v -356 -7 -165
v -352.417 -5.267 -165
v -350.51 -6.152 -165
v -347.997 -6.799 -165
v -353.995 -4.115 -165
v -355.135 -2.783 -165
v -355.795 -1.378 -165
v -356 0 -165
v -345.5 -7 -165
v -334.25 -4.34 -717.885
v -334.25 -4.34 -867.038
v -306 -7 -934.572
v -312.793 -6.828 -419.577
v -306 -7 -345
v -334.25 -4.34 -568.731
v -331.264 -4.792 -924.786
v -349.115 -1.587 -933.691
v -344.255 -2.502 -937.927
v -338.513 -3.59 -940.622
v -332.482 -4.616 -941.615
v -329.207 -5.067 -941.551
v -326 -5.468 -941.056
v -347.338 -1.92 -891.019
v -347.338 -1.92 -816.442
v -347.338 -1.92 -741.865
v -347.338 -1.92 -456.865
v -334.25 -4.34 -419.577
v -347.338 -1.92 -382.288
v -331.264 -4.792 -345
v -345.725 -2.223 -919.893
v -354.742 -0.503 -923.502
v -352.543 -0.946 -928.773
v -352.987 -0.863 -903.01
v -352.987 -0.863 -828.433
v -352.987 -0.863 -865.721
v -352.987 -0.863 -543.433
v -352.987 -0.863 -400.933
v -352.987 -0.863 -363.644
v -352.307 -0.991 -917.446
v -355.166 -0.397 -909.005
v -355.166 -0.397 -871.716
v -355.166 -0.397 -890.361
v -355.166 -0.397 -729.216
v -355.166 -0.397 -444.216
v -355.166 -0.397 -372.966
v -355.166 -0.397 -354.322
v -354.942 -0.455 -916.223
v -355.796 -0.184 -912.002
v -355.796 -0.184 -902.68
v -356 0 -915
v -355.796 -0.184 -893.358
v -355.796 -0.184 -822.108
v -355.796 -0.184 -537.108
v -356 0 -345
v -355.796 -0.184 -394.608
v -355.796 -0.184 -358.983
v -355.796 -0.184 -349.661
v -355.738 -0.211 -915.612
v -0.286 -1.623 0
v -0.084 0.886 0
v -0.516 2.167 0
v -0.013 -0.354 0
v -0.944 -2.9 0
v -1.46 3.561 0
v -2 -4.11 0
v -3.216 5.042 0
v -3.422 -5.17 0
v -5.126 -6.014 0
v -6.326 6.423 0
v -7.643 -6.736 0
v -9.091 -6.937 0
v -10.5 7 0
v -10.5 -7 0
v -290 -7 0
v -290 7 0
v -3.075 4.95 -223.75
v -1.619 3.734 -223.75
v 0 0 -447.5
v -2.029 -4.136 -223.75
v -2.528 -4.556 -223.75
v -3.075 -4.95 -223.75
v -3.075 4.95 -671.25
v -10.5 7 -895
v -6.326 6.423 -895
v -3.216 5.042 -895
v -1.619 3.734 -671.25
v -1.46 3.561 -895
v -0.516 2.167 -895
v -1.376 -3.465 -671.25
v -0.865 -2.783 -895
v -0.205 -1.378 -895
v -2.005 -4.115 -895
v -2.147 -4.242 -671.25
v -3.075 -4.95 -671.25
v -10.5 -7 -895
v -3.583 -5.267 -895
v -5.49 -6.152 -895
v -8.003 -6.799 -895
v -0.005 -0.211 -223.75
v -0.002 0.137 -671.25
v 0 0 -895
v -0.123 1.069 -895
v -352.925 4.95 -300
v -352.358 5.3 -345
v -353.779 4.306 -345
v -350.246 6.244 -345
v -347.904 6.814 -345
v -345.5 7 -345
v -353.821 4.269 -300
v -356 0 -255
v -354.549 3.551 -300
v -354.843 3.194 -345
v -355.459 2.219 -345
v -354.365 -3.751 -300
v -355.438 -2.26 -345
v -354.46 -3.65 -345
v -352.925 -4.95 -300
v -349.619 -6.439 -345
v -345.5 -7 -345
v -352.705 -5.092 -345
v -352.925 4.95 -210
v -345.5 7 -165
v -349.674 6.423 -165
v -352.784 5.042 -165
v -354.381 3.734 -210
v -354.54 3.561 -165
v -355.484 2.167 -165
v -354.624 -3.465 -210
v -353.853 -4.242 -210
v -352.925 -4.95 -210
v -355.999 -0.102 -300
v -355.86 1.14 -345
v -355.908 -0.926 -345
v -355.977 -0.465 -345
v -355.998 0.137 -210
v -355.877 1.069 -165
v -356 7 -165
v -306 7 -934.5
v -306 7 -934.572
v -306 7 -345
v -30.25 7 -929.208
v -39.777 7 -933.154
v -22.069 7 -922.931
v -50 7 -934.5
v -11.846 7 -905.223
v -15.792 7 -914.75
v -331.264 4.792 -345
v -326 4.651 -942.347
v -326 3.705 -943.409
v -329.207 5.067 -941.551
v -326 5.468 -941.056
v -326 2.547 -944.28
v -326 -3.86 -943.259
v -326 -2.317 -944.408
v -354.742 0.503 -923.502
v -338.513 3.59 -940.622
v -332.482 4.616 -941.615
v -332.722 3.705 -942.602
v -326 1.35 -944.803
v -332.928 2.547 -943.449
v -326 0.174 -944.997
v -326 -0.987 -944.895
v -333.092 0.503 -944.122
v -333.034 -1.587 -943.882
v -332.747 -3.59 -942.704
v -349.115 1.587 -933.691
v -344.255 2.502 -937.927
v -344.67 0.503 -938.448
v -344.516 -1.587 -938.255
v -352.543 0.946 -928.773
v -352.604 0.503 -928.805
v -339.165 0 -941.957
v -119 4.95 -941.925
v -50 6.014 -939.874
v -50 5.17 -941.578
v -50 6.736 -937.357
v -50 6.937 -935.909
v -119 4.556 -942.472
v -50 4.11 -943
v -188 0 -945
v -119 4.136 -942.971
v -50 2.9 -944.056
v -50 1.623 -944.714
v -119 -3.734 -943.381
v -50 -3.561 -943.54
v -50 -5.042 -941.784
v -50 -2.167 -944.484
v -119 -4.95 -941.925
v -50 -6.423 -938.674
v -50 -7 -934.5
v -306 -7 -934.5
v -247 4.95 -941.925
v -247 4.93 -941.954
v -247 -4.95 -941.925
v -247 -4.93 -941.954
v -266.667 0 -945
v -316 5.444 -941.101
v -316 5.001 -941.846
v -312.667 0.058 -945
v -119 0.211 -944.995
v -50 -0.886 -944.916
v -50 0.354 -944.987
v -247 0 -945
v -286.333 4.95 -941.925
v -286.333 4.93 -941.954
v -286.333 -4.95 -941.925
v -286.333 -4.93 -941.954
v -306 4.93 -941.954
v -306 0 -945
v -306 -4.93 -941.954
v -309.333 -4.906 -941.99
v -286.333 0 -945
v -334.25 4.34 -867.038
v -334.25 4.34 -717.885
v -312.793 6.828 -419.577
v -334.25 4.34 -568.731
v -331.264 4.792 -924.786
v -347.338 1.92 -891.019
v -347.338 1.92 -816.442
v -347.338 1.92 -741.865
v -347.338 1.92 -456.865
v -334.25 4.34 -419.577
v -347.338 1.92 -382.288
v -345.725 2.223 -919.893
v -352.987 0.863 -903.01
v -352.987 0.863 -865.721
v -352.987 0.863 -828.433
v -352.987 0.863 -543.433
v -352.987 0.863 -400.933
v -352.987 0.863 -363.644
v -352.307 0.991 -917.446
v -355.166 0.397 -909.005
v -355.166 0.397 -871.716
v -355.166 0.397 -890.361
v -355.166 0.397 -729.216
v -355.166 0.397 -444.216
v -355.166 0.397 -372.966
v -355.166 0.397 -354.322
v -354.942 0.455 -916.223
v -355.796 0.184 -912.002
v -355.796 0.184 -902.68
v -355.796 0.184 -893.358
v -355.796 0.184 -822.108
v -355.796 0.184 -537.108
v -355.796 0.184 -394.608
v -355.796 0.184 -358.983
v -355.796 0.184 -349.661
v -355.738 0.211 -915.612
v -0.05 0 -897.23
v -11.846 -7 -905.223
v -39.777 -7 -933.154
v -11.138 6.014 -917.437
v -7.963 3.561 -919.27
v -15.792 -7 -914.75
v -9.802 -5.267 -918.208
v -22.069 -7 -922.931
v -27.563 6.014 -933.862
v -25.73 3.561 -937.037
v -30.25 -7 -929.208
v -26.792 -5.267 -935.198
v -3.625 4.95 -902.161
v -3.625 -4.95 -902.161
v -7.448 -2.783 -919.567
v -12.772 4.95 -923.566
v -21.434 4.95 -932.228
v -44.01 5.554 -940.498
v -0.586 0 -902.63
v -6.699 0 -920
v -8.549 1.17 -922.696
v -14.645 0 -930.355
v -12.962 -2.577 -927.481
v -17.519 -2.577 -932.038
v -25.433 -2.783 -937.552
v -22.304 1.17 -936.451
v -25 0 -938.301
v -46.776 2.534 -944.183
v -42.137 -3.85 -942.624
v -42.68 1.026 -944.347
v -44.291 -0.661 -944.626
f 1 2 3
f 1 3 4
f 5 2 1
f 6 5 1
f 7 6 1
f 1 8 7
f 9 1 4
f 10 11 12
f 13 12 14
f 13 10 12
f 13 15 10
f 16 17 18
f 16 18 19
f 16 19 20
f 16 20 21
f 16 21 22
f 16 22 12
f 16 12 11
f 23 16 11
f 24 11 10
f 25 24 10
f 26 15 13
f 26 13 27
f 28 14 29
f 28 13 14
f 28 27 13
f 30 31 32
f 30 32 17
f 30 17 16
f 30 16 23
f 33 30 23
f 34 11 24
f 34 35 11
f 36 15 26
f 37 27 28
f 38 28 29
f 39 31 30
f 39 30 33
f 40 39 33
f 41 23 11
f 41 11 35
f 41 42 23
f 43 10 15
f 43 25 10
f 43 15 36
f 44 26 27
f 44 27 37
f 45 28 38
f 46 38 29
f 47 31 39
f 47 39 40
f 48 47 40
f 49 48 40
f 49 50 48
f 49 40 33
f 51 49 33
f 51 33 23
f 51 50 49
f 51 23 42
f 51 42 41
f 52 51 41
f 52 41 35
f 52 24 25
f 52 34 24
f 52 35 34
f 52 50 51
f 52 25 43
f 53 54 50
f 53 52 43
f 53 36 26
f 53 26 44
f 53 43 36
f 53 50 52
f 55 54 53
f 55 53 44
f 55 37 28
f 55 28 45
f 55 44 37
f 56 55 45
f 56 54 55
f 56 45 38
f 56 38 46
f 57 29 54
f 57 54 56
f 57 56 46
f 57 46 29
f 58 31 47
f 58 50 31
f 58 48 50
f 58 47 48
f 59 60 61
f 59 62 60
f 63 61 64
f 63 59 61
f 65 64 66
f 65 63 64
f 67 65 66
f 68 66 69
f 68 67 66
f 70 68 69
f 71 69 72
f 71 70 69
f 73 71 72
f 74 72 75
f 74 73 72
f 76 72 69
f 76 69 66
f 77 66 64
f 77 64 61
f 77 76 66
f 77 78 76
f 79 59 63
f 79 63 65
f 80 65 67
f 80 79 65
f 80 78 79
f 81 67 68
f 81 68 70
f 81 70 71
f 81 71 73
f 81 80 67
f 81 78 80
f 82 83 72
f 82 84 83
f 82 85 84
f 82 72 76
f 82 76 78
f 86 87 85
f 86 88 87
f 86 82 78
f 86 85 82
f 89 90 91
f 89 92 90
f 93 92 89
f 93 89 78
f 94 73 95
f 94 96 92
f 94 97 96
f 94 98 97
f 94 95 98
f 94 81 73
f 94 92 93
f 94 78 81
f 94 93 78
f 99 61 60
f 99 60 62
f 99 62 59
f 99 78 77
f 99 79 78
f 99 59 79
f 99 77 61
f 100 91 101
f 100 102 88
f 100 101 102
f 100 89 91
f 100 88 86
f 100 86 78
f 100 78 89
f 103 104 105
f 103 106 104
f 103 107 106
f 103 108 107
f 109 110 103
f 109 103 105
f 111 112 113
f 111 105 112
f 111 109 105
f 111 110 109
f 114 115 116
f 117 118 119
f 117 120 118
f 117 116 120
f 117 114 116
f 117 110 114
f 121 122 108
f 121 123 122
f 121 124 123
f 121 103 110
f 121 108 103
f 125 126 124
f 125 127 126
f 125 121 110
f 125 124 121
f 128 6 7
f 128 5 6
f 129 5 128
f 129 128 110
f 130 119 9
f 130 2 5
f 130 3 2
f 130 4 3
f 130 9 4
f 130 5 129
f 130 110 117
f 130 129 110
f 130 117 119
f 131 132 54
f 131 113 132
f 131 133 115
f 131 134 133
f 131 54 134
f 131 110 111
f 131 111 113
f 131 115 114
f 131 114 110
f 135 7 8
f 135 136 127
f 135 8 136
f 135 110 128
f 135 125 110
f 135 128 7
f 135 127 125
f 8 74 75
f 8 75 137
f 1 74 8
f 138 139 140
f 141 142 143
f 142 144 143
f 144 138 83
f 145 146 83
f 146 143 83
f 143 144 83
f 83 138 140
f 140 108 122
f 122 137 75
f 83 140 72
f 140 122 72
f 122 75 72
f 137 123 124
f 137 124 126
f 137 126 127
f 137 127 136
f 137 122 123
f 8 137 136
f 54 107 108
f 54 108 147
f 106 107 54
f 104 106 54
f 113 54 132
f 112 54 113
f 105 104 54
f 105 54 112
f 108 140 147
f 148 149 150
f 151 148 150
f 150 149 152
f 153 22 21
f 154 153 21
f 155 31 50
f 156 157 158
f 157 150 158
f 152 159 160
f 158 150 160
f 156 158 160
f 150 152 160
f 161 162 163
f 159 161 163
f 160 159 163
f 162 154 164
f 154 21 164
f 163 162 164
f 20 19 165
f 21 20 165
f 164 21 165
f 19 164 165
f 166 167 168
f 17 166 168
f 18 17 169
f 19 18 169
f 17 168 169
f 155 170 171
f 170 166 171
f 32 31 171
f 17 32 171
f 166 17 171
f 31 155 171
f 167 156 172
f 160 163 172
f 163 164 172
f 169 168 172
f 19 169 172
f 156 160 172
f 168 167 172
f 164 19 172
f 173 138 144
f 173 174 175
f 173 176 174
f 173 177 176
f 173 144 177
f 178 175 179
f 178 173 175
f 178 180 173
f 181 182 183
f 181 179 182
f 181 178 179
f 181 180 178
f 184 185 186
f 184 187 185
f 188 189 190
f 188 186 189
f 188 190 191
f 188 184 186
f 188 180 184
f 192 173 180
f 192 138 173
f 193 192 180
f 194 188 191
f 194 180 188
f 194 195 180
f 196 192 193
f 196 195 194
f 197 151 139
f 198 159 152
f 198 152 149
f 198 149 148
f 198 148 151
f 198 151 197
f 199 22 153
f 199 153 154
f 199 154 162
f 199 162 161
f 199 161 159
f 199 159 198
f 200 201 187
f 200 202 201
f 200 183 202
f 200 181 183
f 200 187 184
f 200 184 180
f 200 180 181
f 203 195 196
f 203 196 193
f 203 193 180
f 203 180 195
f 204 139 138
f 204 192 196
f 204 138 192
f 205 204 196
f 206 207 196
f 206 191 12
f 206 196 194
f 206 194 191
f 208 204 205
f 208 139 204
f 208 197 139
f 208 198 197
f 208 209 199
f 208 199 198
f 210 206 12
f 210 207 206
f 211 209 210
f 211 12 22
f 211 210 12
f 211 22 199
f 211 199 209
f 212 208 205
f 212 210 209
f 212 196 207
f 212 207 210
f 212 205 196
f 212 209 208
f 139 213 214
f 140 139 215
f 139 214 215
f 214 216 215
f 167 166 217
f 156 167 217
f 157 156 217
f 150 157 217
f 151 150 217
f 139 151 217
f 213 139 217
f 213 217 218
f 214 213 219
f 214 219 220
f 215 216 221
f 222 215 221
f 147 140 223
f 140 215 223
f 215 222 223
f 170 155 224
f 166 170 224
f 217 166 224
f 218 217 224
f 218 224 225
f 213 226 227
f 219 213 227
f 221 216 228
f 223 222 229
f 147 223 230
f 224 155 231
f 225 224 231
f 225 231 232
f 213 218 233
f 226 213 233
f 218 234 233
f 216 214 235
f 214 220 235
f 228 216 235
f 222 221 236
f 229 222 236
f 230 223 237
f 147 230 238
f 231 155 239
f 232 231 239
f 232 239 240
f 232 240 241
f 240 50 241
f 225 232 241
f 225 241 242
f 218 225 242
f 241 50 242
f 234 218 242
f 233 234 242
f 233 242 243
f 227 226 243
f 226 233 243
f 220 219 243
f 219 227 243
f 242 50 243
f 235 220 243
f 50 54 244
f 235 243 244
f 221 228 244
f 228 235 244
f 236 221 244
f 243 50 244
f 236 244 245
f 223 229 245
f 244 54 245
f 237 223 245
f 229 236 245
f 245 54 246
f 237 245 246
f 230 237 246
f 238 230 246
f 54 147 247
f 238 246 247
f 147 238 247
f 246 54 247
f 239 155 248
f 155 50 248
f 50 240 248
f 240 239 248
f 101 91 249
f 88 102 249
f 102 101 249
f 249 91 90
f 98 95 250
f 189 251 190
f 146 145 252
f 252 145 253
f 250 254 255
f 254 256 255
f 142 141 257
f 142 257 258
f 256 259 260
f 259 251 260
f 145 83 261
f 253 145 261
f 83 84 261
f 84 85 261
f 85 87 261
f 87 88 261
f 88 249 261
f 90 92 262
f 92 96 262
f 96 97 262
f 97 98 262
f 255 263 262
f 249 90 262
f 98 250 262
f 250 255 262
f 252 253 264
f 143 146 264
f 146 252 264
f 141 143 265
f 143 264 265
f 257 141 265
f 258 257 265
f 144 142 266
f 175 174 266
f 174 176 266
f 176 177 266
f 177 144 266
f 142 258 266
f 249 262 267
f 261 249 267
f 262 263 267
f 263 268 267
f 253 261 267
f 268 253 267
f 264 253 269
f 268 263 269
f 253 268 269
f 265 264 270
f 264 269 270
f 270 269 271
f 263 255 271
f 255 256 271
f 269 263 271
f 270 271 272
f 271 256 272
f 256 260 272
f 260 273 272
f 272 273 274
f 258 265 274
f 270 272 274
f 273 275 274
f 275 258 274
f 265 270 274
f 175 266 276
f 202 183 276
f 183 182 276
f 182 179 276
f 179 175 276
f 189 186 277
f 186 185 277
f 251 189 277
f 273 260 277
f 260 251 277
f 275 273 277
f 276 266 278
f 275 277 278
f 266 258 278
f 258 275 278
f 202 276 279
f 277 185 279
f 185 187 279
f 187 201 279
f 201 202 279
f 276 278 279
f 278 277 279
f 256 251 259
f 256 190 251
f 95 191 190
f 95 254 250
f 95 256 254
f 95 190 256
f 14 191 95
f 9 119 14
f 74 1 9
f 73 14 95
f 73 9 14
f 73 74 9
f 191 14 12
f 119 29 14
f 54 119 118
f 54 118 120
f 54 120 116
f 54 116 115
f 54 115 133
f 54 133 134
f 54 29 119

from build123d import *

# Parameters (mm, degrees)
F2_DEPTH = 7
F8_DEPTH = 975


with BuildPart() as f2:
    # F1 (on Front) → F2 (new body, symmetric)
    with BuildSketch(Plane.XZ):
        with BuildLine():
            Line((0, -895), (0, 0))
            Line((0, 0), (-290, 0))
            Line((-290, 0), (-356, -165))
            Line((-356, -165), (-356, -915))
            ThreePointArc((-356, -915), (-347.2132034356, -936.2132034356), (-326, -945))
            Line((-326, -945), (-50, -945))
            ThreePointArc((-50, -945), (-14.6446609407, -930.3553390593), (0, -895))
        make_face()
    extrude(amount=F2_DEPTH, both=True)

    # F7: sweep along a path in F6
    with BuildLine(Plane.XZ) as f7_path:
        Line((0, 0), (0, -895))
        ThreePointArc((0, -895), (-14.6446609407, -930.3553390593), (-50, -945))
        Line((-50, -945), (-326, -945))
        ThreePointArc((-326, -945), (-347.2132034356, -936.2132034356), (-356, -915))
        Line((-356, -915), (-356, -165))
    # F3 (on Top) → F7 (sweep, cut)
    with BuildSketch(Plane.XY):
        with BuildLine():
            add(Edge.make_bspline(
                [(-10.5, -7), (0, -7), (0, 0), (0, 7), (-10.5, 7)],
                knots=[1.5707963268, 1.5707963268, 1.5707963268, 3.1415926536, 3.1415926536, 4.7123889804, 4.7123889804, 4.7123889804], degree=2, weights=[1, 0.7071067812, 1, 0.7071067812, 1]))
            Line((-10.5, -7), (-10.5, -10.9903514385))
            Line((-10.5, -10.9903514385), (2.9582334682, -10.9903514385))
            Line((2.9582334682, -10.9903514385), (2.9582334682, 9.6543207765))
            Line((2.9582334682, 9.6543207765), (-10.5, 9.6543207765))
            Line((-10.5, 9.6543207765), (-10.5, 7))
        make_face()
    sweep(path=f7_path.line, mode=Mode.SUBTRACT)

    # F5 (on offset) → F8 (cut)
    with BuildSketch(Plane.XY.offset(-345)):
        with BuildLine():
            add(Edge.make_bspline(
                [(-356, 0), (-355.9996167193, -0.0454979949), (-355.7262318617, -0.3490169016), (-351.6143061608, -1.1228221561), (-344.1757011611, -2.5027621783), (-334.2818527153, -4.4295739273), (-327.4112328055, -5.2982865334), (-320.106609709, -6.1901737902), (-312.7811010491, -6.9295265019), (-308.3315673438, -6.9911803665), (-306, -6.999836)],
                knots=[0, 0, 0, 0, 0.0262702759, 0.1267393838, 0.2761689471, 0.4425533677, 0.5809422546, 0.7218358167, 0.8636471523, 1, 1, 1, 1], degree=3))
            add(Edge.make_bspline(
                [(-356, 0), (-355.9996167193, 0.0454979949), (-355.7262318617, 0.3490169016), (-351.6143061608, 1.1228221561), (-344.1757011611, 2.5027621783), (-334.2818527153, 4.4295739273), (-327.4112328055, 5.2982865334), (-320.106609709, 6.1901737902), (-312.7811010491, 6.9295265019), (-308.3315673438, 6.9911803665), (-306, 6.999836)],
                knots=[0, 0, 0, 0, 0.0262702759, 0.1267393838, 0.2761689471, 0.4425533677, 0.5809422546, 0.7218358167, 0.8636471523, 1, 1, 1, 1], degree=3))
            Line((-306, 6.999836), (-306, 8.1787118688))
            Line((-306, 8.1787118688), (-357.3989272118, 8.1787118688))
            Line((-357.3989272118, 8.1787118688), (-357.3989272118, -8.1787118688))
            Line((-357.3989272118, -8.1787118688), (-306, -8.1787118688))
            Line((-306, -8.1787118688), (-306, -6.999836))
        make_face()
    extrude(amount=-F8_DEPTH, mode=Mode.SUBTRACT)


solid = f2.part
